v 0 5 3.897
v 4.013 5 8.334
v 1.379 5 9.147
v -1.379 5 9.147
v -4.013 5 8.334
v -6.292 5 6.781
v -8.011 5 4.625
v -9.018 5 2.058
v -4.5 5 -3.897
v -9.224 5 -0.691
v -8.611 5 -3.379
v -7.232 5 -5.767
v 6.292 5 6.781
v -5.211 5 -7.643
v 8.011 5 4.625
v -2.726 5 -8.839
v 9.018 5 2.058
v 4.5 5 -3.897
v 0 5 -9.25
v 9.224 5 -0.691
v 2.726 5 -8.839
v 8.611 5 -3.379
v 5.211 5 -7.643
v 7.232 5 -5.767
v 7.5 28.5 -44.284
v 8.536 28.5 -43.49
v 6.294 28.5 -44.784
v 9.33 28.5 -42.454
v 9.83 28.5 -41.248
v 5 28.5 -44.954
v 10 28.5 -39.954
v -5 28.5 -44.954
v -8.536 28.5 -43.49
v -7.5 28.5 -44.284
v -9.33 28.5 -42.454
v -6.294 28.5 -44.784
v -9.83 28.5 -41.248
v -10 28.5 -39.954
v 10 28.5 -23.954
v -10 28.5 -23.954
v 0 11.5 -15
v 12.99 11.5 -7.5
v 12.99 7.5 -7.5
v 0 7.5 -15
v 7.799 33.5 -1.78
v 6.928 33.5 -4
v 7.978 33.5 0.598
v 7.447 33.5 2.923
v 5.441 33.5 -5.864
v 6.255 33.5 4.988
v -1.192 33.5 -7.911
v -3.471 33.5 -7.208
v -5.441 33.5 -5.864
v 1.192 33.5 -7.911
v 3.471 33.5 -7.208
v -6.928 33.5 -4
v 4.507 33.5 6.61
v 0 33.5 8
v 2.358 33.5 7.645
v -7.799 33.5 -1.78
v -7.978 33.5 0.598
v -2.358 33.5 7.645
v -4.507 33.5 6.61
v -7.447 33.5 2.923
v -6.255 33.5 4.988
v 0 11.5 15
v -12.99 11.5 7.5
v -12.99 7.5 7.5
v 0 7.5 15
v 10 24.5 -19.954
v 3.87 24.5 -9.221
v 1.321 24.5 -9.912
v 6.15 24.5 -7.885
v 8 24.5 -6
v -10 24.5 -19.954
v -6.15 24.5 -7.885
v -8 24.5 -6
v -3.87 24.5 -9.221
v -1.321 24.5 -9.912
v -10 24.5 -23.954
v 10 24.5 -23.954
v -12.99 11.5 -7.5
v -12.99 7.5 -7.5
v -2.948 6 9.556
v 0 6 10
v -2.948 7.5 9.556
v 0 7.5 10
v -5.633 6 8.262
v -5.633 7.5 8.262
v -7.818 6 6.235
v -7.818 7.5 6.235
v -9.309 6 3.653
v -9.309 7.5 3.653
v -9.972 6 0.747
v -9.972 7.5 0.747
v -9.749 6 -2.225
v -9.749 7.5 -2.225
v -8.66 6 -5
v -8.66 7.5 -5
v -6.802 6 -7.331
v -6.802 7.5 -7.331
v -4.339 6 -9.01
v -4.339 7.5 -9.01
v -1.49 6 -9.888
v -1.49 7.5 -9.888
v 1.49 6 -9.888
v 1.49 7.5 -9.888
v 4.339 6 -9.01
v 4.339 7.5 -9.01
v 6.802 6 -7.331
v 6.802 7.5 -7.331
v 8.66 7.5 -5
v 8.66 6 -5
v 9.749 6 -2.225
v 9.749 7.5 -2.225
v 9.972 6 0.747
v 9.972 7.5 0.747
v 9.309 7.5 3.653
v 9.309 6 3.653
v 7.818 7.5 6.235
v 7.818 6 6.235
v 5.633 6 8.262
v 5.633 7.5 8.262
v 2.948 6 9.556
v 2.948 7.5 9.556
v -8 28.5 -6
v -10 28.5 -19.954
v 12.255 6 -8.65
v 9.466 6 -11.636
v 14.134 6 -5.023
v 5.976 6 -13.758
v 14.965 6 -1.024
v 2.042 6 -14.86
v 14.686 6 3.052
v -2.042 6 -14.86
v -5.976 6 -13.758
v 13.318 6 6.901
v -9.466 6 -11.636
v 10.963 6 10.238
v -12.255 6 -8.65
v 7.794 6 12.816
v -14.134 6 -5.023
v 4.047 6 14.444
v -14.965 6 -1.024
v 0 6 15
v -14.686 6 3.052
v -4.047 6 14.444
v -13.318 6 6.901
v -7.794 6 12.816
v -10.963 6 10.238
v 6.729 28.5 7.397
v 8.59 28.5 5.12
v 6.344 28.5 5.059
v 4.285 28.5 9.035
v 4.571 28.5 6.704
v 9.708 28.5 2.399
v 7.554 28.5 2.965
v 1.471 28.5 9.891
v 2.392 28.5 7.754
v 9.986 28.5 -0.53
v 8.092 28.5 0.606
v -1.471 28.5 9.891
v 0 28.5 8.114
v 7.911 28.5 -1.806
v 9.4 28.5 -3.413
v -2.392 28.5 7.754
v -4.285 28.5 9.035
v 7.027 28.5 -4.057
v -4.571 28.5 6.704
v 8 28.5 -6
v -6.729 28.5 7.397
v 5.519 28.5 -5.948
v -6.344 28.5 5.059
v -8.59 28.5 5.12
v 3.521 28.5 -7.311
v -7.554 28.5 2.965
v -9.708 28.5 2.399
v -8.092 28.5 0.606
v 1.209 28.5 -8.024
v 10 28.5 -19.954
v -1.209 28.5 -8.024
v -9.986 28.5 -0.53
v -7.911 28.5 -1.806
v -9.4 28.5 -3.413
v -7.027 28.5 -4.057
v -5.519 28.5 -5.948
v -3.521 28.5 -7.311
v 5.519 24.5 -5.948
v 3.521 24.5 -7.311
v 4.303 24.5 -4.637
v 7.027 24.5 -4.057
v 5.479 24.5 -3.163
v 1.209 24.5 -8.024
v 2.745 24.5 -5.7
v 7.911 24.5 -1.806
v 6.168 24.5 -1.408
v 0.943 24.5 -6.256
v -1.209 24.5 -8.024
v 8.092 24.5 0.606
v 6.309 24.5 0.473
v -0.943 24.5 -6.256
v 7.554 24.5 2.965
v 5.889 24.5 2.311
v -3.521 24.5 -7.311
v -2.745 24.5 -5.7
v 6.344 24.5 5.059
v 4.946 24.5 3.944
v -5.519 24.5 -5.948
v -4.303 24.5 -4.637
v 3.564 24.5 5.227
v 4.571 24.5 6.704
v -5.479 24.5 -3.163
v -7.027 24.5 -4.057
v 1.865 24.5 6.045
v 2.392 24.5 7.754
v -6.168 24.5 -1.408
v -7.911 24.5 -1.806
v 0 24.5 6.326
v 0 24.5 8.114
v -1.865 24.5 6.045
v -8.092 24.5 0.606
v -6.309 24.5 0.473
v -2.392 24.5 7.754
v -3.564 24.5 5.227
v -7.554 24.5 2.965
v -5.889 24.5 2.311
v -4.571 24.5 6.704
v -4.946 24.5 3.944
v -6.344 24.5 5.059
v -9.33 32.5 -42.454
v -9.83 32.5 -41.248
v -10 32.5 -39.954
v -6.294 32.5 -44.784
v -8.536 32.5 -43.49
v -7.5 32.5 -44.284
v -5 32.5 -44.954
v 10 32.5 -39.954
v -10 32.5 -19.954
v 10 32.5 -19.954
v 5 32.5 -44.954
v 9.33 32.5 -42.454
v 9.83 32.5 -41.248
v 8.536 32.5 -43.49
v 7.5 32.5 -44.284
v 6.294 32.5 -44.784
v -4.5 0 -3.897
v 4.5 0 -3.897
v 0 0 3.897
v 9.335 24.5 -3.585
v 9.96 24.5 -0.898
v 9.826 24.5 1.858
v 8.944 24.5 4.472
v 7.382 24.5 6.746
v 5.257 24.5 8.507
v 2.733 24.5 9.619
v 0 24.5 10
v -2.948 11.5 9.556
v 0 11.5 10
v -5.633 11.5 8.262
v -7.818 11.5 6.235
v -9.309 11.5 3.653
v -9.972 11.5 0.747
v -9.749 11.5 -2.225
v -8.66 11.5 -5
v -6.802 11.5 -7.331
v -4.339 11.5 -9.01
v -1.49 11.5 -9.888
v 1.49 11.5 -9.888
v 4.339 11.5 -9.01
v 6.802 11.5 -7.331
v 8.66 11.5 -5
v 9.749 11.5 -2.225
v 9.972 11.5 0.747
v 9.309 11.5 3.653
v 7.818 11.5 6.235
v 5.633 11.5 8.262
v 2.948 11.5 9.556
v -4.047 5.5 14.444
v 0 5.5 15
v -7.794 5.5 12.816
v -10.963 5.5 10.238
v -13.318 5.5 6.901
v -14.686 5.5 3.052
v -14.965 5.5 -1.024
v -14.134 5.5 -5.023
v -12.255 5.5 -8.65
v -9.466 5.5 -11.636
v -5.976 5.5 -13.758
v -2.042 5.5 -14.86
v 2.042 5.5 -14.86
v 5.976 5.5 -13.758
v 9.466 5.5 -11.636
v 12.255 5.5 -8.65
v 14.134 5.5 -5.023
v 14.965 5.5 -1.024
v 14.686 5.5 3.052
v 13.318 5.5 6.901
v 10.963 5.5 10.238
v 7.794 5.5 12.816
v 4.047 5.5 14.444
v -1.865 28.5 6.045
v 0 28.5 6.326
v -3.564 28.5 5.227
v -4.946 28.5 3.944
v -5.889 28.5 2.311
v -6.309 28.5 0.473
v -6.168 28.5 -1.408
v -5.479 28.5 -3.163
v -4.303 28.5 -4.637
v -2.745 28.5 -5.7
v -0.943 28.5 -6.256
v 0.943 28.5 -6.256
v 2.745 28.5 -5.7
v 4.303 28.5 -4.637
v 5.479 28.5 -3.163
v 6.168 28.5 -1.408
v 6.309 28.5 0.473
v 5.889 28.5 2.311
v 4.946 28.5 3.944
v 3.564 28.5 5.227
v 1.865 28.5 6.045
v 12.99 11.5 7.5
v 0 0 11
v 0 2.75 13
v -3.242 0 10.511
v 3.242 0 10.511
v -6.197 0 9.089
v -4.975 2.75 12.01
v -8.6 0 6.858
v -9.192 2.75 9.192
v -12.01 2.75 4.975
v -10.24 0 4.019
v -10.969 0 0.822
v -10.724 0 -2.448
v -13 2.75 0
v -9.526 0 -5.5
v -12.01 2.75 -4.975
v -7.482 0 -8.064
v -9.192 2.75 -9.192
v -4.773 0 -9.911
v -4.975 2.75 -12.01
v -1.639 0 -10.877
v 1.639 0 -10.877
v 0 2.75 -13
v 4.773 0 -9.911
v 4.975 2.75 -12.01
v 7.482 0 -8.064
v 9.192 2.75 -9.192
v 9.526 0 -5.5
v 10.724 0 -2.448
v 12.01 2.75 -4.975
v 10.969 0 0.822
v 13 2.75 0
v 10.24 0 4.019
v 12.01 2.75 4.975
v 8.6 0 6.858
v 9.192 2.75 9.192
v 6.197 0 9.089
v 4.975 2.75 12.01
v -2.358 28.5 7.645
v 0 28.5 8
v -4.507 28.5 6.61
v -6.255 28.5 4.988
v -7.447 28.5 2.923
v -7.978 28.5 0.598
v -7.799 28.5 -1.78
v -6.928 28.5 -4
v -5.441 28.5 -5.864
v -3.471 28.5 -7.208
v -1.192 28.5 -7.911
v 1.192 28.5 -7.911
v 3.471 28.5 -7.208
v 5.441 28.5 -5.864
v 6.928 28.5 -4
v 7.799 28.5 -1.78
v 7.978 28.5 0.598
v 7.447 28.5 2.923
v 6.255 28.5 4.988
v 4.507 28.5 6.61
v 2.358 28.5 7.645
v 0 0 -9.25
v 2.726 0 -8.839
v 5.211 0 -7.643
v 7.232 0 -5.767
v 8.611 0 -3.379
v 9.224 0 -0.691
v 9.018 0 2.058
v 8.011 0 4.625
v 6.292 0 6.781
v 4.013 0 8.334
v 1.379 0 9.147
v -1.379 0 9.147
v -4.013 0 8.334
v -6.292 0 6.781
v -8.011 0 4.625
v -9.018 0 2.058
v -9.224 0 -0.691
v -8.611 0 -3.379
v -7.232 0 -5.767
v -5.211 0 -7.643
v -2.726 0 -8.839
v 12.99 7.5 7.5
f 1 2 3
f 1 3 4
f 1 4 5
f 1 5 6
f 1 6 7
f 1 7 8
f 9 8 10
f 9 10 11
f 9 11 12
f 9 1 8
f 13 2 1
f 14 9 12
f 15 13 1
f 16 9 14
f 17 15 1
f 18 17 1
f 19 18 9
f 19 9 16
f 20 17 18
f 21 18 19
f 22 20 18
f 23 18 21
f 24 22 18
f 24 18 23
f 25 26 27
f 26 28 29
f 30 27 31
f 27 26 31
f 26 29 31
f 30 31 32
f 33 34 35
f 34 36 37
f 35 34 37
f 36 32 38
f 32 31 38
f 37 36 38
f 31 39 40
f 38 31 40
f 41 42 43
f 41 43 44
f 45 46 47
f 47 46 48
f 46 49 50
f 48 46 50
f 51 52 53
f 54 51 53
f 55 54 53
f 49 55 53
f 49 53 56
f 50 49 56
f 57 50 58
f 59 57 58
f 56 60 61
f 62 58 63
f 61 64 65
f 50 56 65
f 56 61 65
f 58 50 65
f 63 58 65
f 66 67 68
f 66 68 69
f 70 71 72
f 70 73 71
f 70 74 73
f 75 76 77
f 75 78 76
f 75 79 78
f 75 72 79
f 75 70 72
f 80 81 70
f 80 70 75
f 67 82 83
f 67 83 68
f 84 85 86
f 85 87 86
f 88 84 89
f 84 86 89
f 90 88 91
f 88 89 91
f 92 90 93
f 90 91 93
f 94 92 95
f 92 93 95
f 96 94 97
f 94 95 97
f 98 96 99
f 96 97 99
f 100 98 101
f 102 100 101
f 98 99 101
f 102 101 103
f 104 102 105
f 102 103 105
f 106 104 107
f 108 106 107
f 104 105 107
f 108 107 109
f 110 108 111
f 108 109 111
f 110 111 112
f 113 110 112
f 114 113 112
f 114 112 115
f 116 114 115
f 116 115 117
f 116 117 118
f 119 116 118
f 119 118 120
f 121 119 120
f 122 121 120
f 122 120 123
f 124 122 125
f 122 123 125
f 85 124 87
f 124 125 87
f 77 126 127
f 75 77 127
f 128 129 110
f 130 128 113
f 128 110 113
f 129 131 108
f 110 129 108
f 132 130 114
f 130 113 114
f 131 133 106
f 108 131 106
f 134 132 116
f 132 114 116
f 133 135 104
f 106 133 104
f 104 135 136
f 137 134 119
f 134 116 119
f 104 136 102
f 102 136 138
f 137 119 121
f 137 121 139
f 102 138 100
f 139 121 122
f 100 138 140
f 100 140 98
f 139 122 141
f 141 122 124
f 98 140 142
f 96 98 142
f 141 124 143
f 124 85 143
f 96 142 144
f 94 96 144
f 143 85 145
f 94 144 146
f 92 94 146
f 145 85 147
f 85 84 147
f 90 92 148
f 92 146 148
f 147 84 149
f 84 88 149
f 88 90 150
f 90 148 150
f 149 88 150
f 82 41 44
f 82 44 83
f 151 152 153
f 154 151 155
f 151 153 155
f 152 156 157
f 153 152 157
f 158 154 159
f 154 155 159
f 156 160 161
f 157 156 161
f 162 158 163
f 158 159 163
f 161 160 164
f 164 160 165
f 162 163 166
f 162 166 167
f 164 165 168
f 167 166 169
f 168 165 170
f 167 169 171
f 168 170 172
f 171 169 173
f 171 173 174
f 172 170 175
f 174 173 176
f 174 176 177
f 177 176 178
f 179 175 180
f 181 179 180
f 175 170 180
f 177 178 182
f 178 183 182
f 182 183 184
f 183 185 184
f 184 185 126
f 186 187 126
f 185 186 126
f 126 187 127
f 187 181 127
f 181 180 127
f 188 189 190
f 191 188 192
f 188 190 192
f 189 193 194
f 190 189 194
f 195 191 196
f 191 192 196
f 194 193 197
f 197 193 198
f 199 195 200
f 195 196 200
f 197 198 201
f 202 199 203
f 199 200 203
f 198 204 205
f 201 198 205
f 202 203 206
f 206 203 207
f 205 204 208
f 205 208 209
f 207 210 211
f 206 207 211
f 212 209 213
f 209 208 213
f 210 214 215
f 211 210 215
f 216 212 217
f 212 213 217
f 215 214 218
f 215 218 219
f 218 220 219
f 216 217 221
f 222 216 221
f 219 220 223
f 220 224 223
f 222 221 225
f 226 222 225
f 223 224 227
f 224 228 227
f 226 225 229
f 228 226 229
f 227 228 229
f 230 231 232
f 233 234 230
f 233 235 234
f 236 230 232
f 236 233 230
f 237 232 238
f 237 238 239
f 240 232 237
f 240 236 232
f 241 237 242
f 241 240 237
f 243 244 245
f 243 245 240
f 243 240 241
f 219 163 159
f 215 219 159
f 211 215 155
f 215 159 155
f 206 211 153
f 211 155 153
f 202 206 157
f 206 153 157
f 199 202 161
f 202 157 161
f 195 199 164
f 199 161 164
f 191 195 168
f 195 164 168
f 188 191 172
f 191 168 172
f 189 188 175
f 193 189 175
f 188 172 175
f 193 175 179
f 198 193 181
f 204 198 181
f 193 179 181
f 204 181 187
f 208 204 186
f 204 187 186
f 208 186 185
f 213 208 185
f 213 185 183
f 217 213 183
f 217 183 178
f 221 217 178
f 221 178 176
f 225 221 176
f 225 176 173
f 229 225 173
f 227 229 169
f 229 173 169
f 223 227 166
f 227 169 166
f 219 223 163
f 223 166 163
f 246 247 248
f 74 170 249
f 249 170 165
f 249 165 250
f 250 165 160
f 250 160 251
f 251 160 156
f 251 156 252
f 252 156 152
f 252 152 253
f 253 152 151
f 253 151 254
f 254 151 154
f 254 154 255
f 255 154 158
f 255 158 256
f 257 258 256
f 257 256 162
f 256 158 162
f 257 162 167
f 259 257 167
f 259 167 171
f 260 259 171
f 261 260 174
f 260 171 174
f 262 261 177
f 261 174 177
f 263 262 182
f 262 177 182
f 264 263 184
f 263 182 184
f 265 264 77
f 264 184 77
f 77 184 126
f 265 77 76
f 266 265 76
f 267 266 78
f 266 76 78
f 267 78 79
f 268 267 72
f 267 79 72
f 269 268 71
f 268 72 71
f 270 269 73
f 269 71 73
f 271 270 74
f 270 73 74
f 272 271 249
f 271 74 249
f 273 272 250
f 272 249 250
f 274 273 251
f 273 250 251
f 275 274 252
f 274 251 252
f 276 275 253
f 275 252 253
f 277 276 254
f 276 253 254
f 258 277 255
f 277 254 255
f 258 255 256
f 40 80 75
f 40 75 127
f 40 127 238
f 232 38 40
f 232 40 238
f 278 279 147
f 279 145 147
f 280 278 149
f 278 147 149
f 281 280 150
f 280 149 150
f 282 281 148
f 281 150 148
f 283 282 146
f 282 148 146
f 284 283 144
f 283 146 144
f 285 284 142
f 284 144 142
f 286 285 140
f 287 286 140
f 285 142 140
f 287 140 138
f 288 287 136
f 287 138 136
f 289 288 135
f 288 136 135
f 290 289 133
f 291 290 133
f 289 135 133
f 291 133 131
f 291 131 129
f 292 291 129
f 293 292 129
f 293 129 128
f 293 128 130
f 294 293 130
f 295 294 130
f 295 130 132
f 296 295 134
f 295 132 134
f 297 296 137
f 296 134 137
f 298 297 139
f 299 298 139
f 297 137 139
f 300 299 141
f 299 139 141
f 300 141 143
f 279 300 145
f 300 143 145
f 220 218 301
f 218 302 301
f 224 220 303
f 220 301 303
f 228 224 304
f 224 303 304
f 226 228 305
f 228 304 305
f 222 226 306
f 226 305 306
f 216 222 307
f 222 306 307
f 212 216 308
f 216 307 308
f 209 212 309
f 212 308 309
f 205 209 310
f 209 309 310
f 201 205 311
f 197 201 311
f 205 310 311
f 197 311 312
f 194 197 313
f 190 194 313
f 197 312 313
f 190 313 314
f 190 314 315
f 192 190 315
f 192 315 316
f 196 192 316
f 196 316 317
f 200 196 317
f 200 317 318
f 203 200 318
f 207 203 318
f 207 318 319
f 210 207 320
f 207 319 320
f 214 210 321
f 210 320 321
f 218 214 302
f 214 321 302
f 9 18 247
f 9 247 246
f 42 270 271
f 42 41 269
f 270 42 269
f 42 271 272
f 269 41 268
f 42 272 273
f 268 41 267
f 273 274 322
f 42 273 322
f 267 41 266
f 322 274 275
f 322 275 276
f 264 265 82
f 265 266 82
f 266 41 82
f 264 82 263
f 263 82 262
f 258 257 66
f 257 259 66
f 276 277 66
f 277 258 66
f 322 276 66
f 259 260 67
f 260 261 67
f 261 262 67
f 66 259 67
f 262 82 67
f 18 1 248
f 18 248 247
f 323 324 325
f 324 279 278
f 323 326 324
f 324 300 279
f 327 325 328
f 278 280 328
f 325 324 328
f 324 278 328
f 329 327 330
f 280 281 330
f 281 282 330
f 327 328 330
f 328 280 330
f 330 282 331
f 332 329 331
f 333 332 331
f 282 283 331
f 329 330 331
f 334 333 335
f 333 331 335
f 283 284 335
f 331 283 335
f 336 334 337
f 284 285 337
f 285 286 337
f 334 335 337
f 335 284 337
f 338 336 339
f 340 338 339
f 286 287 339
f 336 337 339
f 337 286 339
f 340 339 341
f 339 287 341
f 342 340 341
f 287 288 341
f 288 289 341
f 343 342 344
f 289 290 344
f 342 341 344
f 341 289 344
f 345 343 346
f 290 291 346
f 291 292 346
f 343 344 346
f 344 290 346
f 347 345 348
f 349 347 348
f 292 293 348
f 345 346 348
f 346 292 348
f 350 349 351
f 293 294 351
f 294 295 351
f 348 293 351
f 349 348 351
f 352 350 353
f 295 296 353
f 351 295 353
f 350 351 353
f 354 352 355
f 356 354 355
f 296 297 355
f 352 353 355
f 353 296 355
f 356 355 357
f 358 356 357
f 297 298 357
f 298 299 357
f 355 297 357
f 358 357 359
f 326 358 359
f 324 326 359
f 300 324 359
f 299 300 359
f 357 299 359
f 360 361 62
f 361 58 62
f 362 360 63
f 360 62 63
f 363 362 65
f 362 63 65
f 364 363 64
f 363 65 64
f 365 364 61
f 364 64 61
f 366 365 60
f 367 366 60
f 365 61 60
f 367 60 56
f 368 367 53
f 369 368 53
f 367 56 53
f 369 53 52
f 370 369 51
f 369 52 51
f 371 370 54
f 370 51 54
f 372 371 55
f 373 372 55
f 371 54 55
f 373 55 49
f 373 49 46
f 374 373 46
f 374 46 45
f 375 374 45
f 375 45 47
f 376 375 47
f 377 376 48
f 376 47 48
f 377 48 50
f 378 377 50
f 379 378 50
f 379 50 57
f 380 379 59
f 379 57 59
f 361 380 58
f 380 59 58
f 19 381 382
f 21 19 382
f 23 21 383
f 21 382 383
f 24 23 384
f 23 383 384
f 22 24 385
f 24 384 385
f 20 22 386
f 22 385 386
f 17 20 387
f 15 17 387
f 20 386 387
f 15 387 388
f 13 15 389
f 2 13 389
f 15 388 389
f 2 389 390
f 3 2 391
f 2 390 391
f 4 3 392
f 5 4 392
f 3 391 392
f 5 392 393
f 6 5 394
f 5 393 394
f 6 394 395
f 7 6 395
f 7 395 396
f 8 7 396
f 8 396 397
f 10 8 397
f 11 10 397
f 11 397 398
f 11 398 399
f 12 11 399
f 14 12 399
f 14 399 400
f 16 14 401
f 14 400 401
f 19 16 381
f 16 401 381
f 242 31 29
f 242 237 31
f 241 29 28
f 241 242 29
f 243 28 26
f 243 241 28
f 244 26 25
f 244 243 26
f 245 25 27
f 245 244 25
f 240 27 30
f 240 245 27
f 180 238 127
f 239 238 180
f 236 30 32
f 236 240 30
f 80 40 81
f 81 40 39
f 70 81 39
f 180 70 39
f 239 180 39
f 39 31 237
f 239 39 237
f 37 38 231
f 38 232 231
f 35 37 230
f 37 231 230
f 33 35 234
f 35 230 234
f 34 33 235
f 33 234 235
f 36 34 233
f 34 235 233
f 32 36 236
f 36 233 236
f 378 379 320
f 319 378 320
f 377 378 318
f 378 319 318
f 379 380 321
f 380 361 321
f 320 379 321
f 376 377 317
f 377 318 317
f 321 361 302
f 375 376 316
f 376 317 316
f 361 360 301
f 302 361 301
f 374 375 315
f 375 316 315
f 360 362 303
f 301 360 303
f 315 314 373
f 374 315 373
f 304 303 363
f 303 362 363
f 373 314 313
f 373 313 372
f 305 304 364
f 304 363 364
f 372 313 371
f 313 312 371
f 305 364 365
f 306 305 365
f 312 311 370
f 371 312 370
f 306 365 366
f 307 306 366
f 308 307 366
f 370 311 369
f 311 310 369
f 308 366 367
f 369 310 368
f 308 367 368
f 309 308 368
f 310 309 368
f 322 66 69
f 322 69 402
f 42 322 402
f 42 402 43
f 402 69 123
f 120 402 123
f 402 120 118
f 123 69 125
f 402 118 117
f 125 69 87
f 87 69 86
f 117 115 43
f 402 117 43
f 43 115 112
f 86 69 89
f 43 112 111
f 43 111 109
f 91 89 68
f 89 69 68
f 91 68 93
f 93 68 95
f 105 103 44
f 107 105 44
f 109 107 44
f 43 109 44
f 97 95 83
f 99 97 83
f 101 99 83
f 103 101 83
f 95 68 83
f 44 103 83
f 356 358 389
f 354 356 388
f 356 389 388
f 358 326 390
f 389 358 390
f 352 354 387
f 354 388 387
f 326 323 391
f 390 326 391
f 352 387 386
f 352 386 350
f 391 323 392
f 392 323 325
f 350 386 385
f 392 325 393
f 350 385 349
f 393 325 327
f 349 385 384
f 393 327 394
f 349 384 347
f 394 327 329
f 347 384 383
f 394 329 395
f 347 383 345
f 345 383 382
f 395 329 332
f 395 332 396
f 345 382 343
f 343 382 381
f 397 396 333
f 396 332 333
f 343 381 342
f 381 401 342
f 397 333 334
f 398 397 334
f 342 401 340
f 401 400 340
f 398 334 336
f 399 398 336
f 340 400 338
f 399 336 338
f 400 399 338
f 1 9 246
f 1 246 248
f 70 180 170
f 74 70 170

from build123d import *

# Parameters (mm, degrees)
EXTRUDE_START       = 4
SKETCH_2_R          = 8.114467409
EXTRUDE_1_DEPTH     = 4
SKETCH_4_R          = 9.25
CUT_EXTRUDE_1_DEPTH = 5
SKETCH_5_OUTSIDE_W  = 43.9
SKETCH_5_OUTSIDE_H  = 52.854
CUT_EXTRUDE_7_DEPTH = 4
EXTRUDE_3_DEPTH     = 5
SKETCH_9_W          = 20
SKETCH_9_H          = 4
EXTRUDE_4_DEPTH     = 21
SKETCH_11_W         = 20
SKETCH_11_H         = 4
EXTRUDE_5_DEPTH     = 4
FILLET_1_R          = 5


with BuildPart() as part:
    # Эскиз1 → Повернуть1 (revolve)
    with BuildSketch(Plane.XY, mode=Mode.PRIVATE) as revolve_1_sk:
        Polygon((0, 0), (11, 0), (15, 5.5), (15, 6), (10, 6), (10, 7.5), (15, 7.5), (15, 11.5), (10, 11.5), (10, 24.5), (6.326264721, 24.5), (6.326264721, 28.5), (8, 28.5), (8, 33.5), (0, 33.5), align=None)
    revolve(revolve_1_sk.sketch.rotate(Axis((0, 38.134324324, 0), (0, -1, 0)), 90), axis=Axis((0, 38.134324324, 0), (0, -1, 0)))

    # Эскиз2 → Вытянуть1 (add)
    with BuildSketch(Plane(origin=(0, 24.5, 0), x_dir=(1, 0, 0), z_dir=(0, 1, 0)).offset(EXTRUDE_START)):
        with BuildLine():
            Line((-8, 6), (-10, 19.953992765))
            Line((-10, 19.953992765), (-10, 23.953992765))
            Line((-10, 23.953992765), (10, 23.953992765))
            Line((10, 23.953992765), (10, 19.953992765))
            Line((10, 19.953992765), (8, 6))
            ThreePointArc((8, 6), (0, -10), (-8, 6))
        make_face()
        with Locations(Location((0, 0, 0), (0, 0, 270))):
            Circle(SKETCH_2_R, mode=Mode.SUBTRACT)
    extrude(amount=-EXTRUDE_1_DEPTH)

    # Эскиз4 → Вырез-Вытянуть1 (cut)
    with BuildSketch(Plane.XZ):
        with Locations(Location((0, 0, 0), (0, 0, 270))):
            Circle(SKETCH_4_R)
    extrude(amount=-CUT_EXTRUDE_1_DEPTH, mode=Mode.SUBTRACT)

    # Эскиз5 outside → Вырез-Вытянуть7 (cut)
    with BuildSketch(Plane(origin=(0, 11.5, 0), x_dir=(1, 0, 0), z_dir=(0, 1, 0))):
        with Locations((0, 4.477)):
            Rectangle(SKETCH_5_OUTSIDE_W, SKETCH_5_OUTSIDE_H)
        Polygon((0, -15), (12.990381057, -7.5), (12.990381057, 7.5), (0, 15), (-12.990381057, 7.5), (-12.990381057, -7.5), align=None, mode=Mode.SUBTRACT)
    extrude(amount=-CUT_EXTRUDE_7_DEPTH, mode=Mode.SUBTRACT)

    # Эскиз6 → Вытянуть3 (add)
    with BuildSketch(Plane.XZ.offset(-5)):
        Polygon((-4.5, -3.897114317), (0, 3.897114317), (4.5, -3.897114317), align=None)
    extrude(amount=EXTRUDE_3_DEPTH)



with BuildPart() as body_2:
    # Эскиз9 → Вытянуть4 (new body)
    with BuildSketch(Plane(origin=(0, 0, -23.953992765), x_dir=(-1, 0, 0), z_dir=(0, 0, -1))):
        with Locations((0, 30.5)):
            Rectangle(SKETCH_9_W, SKETCH_9_H)
    extrude(amount=EXTRUDE_4_DEPTH)


with BuildPart() as part_1:
    add(part.part)

    add(body_2.part)  # Вытянуть5 merges body 2
    # Эскиз11 → Вытянуть5 (add)
    with BuildSketch(Plane.XY.offset(-23.953992765)):
        with Locations((0, 30.5)):
            Rectangle(SKETCH_11_W, SKETCH_11_H)
    extrude(amount=EXTRUDE_5_DEPTH)

    # Скругление1
    fillet_1_edges = [part_1.edges().sort_by_distance(p)[0] for p in [
        (10, 30.5, -44.953992765),
        (-10, 30.5, -44.953992765),
    ]]
    fillet(fillet_1_edges, radius=FILLET_1_R)


solid = part_1.part
